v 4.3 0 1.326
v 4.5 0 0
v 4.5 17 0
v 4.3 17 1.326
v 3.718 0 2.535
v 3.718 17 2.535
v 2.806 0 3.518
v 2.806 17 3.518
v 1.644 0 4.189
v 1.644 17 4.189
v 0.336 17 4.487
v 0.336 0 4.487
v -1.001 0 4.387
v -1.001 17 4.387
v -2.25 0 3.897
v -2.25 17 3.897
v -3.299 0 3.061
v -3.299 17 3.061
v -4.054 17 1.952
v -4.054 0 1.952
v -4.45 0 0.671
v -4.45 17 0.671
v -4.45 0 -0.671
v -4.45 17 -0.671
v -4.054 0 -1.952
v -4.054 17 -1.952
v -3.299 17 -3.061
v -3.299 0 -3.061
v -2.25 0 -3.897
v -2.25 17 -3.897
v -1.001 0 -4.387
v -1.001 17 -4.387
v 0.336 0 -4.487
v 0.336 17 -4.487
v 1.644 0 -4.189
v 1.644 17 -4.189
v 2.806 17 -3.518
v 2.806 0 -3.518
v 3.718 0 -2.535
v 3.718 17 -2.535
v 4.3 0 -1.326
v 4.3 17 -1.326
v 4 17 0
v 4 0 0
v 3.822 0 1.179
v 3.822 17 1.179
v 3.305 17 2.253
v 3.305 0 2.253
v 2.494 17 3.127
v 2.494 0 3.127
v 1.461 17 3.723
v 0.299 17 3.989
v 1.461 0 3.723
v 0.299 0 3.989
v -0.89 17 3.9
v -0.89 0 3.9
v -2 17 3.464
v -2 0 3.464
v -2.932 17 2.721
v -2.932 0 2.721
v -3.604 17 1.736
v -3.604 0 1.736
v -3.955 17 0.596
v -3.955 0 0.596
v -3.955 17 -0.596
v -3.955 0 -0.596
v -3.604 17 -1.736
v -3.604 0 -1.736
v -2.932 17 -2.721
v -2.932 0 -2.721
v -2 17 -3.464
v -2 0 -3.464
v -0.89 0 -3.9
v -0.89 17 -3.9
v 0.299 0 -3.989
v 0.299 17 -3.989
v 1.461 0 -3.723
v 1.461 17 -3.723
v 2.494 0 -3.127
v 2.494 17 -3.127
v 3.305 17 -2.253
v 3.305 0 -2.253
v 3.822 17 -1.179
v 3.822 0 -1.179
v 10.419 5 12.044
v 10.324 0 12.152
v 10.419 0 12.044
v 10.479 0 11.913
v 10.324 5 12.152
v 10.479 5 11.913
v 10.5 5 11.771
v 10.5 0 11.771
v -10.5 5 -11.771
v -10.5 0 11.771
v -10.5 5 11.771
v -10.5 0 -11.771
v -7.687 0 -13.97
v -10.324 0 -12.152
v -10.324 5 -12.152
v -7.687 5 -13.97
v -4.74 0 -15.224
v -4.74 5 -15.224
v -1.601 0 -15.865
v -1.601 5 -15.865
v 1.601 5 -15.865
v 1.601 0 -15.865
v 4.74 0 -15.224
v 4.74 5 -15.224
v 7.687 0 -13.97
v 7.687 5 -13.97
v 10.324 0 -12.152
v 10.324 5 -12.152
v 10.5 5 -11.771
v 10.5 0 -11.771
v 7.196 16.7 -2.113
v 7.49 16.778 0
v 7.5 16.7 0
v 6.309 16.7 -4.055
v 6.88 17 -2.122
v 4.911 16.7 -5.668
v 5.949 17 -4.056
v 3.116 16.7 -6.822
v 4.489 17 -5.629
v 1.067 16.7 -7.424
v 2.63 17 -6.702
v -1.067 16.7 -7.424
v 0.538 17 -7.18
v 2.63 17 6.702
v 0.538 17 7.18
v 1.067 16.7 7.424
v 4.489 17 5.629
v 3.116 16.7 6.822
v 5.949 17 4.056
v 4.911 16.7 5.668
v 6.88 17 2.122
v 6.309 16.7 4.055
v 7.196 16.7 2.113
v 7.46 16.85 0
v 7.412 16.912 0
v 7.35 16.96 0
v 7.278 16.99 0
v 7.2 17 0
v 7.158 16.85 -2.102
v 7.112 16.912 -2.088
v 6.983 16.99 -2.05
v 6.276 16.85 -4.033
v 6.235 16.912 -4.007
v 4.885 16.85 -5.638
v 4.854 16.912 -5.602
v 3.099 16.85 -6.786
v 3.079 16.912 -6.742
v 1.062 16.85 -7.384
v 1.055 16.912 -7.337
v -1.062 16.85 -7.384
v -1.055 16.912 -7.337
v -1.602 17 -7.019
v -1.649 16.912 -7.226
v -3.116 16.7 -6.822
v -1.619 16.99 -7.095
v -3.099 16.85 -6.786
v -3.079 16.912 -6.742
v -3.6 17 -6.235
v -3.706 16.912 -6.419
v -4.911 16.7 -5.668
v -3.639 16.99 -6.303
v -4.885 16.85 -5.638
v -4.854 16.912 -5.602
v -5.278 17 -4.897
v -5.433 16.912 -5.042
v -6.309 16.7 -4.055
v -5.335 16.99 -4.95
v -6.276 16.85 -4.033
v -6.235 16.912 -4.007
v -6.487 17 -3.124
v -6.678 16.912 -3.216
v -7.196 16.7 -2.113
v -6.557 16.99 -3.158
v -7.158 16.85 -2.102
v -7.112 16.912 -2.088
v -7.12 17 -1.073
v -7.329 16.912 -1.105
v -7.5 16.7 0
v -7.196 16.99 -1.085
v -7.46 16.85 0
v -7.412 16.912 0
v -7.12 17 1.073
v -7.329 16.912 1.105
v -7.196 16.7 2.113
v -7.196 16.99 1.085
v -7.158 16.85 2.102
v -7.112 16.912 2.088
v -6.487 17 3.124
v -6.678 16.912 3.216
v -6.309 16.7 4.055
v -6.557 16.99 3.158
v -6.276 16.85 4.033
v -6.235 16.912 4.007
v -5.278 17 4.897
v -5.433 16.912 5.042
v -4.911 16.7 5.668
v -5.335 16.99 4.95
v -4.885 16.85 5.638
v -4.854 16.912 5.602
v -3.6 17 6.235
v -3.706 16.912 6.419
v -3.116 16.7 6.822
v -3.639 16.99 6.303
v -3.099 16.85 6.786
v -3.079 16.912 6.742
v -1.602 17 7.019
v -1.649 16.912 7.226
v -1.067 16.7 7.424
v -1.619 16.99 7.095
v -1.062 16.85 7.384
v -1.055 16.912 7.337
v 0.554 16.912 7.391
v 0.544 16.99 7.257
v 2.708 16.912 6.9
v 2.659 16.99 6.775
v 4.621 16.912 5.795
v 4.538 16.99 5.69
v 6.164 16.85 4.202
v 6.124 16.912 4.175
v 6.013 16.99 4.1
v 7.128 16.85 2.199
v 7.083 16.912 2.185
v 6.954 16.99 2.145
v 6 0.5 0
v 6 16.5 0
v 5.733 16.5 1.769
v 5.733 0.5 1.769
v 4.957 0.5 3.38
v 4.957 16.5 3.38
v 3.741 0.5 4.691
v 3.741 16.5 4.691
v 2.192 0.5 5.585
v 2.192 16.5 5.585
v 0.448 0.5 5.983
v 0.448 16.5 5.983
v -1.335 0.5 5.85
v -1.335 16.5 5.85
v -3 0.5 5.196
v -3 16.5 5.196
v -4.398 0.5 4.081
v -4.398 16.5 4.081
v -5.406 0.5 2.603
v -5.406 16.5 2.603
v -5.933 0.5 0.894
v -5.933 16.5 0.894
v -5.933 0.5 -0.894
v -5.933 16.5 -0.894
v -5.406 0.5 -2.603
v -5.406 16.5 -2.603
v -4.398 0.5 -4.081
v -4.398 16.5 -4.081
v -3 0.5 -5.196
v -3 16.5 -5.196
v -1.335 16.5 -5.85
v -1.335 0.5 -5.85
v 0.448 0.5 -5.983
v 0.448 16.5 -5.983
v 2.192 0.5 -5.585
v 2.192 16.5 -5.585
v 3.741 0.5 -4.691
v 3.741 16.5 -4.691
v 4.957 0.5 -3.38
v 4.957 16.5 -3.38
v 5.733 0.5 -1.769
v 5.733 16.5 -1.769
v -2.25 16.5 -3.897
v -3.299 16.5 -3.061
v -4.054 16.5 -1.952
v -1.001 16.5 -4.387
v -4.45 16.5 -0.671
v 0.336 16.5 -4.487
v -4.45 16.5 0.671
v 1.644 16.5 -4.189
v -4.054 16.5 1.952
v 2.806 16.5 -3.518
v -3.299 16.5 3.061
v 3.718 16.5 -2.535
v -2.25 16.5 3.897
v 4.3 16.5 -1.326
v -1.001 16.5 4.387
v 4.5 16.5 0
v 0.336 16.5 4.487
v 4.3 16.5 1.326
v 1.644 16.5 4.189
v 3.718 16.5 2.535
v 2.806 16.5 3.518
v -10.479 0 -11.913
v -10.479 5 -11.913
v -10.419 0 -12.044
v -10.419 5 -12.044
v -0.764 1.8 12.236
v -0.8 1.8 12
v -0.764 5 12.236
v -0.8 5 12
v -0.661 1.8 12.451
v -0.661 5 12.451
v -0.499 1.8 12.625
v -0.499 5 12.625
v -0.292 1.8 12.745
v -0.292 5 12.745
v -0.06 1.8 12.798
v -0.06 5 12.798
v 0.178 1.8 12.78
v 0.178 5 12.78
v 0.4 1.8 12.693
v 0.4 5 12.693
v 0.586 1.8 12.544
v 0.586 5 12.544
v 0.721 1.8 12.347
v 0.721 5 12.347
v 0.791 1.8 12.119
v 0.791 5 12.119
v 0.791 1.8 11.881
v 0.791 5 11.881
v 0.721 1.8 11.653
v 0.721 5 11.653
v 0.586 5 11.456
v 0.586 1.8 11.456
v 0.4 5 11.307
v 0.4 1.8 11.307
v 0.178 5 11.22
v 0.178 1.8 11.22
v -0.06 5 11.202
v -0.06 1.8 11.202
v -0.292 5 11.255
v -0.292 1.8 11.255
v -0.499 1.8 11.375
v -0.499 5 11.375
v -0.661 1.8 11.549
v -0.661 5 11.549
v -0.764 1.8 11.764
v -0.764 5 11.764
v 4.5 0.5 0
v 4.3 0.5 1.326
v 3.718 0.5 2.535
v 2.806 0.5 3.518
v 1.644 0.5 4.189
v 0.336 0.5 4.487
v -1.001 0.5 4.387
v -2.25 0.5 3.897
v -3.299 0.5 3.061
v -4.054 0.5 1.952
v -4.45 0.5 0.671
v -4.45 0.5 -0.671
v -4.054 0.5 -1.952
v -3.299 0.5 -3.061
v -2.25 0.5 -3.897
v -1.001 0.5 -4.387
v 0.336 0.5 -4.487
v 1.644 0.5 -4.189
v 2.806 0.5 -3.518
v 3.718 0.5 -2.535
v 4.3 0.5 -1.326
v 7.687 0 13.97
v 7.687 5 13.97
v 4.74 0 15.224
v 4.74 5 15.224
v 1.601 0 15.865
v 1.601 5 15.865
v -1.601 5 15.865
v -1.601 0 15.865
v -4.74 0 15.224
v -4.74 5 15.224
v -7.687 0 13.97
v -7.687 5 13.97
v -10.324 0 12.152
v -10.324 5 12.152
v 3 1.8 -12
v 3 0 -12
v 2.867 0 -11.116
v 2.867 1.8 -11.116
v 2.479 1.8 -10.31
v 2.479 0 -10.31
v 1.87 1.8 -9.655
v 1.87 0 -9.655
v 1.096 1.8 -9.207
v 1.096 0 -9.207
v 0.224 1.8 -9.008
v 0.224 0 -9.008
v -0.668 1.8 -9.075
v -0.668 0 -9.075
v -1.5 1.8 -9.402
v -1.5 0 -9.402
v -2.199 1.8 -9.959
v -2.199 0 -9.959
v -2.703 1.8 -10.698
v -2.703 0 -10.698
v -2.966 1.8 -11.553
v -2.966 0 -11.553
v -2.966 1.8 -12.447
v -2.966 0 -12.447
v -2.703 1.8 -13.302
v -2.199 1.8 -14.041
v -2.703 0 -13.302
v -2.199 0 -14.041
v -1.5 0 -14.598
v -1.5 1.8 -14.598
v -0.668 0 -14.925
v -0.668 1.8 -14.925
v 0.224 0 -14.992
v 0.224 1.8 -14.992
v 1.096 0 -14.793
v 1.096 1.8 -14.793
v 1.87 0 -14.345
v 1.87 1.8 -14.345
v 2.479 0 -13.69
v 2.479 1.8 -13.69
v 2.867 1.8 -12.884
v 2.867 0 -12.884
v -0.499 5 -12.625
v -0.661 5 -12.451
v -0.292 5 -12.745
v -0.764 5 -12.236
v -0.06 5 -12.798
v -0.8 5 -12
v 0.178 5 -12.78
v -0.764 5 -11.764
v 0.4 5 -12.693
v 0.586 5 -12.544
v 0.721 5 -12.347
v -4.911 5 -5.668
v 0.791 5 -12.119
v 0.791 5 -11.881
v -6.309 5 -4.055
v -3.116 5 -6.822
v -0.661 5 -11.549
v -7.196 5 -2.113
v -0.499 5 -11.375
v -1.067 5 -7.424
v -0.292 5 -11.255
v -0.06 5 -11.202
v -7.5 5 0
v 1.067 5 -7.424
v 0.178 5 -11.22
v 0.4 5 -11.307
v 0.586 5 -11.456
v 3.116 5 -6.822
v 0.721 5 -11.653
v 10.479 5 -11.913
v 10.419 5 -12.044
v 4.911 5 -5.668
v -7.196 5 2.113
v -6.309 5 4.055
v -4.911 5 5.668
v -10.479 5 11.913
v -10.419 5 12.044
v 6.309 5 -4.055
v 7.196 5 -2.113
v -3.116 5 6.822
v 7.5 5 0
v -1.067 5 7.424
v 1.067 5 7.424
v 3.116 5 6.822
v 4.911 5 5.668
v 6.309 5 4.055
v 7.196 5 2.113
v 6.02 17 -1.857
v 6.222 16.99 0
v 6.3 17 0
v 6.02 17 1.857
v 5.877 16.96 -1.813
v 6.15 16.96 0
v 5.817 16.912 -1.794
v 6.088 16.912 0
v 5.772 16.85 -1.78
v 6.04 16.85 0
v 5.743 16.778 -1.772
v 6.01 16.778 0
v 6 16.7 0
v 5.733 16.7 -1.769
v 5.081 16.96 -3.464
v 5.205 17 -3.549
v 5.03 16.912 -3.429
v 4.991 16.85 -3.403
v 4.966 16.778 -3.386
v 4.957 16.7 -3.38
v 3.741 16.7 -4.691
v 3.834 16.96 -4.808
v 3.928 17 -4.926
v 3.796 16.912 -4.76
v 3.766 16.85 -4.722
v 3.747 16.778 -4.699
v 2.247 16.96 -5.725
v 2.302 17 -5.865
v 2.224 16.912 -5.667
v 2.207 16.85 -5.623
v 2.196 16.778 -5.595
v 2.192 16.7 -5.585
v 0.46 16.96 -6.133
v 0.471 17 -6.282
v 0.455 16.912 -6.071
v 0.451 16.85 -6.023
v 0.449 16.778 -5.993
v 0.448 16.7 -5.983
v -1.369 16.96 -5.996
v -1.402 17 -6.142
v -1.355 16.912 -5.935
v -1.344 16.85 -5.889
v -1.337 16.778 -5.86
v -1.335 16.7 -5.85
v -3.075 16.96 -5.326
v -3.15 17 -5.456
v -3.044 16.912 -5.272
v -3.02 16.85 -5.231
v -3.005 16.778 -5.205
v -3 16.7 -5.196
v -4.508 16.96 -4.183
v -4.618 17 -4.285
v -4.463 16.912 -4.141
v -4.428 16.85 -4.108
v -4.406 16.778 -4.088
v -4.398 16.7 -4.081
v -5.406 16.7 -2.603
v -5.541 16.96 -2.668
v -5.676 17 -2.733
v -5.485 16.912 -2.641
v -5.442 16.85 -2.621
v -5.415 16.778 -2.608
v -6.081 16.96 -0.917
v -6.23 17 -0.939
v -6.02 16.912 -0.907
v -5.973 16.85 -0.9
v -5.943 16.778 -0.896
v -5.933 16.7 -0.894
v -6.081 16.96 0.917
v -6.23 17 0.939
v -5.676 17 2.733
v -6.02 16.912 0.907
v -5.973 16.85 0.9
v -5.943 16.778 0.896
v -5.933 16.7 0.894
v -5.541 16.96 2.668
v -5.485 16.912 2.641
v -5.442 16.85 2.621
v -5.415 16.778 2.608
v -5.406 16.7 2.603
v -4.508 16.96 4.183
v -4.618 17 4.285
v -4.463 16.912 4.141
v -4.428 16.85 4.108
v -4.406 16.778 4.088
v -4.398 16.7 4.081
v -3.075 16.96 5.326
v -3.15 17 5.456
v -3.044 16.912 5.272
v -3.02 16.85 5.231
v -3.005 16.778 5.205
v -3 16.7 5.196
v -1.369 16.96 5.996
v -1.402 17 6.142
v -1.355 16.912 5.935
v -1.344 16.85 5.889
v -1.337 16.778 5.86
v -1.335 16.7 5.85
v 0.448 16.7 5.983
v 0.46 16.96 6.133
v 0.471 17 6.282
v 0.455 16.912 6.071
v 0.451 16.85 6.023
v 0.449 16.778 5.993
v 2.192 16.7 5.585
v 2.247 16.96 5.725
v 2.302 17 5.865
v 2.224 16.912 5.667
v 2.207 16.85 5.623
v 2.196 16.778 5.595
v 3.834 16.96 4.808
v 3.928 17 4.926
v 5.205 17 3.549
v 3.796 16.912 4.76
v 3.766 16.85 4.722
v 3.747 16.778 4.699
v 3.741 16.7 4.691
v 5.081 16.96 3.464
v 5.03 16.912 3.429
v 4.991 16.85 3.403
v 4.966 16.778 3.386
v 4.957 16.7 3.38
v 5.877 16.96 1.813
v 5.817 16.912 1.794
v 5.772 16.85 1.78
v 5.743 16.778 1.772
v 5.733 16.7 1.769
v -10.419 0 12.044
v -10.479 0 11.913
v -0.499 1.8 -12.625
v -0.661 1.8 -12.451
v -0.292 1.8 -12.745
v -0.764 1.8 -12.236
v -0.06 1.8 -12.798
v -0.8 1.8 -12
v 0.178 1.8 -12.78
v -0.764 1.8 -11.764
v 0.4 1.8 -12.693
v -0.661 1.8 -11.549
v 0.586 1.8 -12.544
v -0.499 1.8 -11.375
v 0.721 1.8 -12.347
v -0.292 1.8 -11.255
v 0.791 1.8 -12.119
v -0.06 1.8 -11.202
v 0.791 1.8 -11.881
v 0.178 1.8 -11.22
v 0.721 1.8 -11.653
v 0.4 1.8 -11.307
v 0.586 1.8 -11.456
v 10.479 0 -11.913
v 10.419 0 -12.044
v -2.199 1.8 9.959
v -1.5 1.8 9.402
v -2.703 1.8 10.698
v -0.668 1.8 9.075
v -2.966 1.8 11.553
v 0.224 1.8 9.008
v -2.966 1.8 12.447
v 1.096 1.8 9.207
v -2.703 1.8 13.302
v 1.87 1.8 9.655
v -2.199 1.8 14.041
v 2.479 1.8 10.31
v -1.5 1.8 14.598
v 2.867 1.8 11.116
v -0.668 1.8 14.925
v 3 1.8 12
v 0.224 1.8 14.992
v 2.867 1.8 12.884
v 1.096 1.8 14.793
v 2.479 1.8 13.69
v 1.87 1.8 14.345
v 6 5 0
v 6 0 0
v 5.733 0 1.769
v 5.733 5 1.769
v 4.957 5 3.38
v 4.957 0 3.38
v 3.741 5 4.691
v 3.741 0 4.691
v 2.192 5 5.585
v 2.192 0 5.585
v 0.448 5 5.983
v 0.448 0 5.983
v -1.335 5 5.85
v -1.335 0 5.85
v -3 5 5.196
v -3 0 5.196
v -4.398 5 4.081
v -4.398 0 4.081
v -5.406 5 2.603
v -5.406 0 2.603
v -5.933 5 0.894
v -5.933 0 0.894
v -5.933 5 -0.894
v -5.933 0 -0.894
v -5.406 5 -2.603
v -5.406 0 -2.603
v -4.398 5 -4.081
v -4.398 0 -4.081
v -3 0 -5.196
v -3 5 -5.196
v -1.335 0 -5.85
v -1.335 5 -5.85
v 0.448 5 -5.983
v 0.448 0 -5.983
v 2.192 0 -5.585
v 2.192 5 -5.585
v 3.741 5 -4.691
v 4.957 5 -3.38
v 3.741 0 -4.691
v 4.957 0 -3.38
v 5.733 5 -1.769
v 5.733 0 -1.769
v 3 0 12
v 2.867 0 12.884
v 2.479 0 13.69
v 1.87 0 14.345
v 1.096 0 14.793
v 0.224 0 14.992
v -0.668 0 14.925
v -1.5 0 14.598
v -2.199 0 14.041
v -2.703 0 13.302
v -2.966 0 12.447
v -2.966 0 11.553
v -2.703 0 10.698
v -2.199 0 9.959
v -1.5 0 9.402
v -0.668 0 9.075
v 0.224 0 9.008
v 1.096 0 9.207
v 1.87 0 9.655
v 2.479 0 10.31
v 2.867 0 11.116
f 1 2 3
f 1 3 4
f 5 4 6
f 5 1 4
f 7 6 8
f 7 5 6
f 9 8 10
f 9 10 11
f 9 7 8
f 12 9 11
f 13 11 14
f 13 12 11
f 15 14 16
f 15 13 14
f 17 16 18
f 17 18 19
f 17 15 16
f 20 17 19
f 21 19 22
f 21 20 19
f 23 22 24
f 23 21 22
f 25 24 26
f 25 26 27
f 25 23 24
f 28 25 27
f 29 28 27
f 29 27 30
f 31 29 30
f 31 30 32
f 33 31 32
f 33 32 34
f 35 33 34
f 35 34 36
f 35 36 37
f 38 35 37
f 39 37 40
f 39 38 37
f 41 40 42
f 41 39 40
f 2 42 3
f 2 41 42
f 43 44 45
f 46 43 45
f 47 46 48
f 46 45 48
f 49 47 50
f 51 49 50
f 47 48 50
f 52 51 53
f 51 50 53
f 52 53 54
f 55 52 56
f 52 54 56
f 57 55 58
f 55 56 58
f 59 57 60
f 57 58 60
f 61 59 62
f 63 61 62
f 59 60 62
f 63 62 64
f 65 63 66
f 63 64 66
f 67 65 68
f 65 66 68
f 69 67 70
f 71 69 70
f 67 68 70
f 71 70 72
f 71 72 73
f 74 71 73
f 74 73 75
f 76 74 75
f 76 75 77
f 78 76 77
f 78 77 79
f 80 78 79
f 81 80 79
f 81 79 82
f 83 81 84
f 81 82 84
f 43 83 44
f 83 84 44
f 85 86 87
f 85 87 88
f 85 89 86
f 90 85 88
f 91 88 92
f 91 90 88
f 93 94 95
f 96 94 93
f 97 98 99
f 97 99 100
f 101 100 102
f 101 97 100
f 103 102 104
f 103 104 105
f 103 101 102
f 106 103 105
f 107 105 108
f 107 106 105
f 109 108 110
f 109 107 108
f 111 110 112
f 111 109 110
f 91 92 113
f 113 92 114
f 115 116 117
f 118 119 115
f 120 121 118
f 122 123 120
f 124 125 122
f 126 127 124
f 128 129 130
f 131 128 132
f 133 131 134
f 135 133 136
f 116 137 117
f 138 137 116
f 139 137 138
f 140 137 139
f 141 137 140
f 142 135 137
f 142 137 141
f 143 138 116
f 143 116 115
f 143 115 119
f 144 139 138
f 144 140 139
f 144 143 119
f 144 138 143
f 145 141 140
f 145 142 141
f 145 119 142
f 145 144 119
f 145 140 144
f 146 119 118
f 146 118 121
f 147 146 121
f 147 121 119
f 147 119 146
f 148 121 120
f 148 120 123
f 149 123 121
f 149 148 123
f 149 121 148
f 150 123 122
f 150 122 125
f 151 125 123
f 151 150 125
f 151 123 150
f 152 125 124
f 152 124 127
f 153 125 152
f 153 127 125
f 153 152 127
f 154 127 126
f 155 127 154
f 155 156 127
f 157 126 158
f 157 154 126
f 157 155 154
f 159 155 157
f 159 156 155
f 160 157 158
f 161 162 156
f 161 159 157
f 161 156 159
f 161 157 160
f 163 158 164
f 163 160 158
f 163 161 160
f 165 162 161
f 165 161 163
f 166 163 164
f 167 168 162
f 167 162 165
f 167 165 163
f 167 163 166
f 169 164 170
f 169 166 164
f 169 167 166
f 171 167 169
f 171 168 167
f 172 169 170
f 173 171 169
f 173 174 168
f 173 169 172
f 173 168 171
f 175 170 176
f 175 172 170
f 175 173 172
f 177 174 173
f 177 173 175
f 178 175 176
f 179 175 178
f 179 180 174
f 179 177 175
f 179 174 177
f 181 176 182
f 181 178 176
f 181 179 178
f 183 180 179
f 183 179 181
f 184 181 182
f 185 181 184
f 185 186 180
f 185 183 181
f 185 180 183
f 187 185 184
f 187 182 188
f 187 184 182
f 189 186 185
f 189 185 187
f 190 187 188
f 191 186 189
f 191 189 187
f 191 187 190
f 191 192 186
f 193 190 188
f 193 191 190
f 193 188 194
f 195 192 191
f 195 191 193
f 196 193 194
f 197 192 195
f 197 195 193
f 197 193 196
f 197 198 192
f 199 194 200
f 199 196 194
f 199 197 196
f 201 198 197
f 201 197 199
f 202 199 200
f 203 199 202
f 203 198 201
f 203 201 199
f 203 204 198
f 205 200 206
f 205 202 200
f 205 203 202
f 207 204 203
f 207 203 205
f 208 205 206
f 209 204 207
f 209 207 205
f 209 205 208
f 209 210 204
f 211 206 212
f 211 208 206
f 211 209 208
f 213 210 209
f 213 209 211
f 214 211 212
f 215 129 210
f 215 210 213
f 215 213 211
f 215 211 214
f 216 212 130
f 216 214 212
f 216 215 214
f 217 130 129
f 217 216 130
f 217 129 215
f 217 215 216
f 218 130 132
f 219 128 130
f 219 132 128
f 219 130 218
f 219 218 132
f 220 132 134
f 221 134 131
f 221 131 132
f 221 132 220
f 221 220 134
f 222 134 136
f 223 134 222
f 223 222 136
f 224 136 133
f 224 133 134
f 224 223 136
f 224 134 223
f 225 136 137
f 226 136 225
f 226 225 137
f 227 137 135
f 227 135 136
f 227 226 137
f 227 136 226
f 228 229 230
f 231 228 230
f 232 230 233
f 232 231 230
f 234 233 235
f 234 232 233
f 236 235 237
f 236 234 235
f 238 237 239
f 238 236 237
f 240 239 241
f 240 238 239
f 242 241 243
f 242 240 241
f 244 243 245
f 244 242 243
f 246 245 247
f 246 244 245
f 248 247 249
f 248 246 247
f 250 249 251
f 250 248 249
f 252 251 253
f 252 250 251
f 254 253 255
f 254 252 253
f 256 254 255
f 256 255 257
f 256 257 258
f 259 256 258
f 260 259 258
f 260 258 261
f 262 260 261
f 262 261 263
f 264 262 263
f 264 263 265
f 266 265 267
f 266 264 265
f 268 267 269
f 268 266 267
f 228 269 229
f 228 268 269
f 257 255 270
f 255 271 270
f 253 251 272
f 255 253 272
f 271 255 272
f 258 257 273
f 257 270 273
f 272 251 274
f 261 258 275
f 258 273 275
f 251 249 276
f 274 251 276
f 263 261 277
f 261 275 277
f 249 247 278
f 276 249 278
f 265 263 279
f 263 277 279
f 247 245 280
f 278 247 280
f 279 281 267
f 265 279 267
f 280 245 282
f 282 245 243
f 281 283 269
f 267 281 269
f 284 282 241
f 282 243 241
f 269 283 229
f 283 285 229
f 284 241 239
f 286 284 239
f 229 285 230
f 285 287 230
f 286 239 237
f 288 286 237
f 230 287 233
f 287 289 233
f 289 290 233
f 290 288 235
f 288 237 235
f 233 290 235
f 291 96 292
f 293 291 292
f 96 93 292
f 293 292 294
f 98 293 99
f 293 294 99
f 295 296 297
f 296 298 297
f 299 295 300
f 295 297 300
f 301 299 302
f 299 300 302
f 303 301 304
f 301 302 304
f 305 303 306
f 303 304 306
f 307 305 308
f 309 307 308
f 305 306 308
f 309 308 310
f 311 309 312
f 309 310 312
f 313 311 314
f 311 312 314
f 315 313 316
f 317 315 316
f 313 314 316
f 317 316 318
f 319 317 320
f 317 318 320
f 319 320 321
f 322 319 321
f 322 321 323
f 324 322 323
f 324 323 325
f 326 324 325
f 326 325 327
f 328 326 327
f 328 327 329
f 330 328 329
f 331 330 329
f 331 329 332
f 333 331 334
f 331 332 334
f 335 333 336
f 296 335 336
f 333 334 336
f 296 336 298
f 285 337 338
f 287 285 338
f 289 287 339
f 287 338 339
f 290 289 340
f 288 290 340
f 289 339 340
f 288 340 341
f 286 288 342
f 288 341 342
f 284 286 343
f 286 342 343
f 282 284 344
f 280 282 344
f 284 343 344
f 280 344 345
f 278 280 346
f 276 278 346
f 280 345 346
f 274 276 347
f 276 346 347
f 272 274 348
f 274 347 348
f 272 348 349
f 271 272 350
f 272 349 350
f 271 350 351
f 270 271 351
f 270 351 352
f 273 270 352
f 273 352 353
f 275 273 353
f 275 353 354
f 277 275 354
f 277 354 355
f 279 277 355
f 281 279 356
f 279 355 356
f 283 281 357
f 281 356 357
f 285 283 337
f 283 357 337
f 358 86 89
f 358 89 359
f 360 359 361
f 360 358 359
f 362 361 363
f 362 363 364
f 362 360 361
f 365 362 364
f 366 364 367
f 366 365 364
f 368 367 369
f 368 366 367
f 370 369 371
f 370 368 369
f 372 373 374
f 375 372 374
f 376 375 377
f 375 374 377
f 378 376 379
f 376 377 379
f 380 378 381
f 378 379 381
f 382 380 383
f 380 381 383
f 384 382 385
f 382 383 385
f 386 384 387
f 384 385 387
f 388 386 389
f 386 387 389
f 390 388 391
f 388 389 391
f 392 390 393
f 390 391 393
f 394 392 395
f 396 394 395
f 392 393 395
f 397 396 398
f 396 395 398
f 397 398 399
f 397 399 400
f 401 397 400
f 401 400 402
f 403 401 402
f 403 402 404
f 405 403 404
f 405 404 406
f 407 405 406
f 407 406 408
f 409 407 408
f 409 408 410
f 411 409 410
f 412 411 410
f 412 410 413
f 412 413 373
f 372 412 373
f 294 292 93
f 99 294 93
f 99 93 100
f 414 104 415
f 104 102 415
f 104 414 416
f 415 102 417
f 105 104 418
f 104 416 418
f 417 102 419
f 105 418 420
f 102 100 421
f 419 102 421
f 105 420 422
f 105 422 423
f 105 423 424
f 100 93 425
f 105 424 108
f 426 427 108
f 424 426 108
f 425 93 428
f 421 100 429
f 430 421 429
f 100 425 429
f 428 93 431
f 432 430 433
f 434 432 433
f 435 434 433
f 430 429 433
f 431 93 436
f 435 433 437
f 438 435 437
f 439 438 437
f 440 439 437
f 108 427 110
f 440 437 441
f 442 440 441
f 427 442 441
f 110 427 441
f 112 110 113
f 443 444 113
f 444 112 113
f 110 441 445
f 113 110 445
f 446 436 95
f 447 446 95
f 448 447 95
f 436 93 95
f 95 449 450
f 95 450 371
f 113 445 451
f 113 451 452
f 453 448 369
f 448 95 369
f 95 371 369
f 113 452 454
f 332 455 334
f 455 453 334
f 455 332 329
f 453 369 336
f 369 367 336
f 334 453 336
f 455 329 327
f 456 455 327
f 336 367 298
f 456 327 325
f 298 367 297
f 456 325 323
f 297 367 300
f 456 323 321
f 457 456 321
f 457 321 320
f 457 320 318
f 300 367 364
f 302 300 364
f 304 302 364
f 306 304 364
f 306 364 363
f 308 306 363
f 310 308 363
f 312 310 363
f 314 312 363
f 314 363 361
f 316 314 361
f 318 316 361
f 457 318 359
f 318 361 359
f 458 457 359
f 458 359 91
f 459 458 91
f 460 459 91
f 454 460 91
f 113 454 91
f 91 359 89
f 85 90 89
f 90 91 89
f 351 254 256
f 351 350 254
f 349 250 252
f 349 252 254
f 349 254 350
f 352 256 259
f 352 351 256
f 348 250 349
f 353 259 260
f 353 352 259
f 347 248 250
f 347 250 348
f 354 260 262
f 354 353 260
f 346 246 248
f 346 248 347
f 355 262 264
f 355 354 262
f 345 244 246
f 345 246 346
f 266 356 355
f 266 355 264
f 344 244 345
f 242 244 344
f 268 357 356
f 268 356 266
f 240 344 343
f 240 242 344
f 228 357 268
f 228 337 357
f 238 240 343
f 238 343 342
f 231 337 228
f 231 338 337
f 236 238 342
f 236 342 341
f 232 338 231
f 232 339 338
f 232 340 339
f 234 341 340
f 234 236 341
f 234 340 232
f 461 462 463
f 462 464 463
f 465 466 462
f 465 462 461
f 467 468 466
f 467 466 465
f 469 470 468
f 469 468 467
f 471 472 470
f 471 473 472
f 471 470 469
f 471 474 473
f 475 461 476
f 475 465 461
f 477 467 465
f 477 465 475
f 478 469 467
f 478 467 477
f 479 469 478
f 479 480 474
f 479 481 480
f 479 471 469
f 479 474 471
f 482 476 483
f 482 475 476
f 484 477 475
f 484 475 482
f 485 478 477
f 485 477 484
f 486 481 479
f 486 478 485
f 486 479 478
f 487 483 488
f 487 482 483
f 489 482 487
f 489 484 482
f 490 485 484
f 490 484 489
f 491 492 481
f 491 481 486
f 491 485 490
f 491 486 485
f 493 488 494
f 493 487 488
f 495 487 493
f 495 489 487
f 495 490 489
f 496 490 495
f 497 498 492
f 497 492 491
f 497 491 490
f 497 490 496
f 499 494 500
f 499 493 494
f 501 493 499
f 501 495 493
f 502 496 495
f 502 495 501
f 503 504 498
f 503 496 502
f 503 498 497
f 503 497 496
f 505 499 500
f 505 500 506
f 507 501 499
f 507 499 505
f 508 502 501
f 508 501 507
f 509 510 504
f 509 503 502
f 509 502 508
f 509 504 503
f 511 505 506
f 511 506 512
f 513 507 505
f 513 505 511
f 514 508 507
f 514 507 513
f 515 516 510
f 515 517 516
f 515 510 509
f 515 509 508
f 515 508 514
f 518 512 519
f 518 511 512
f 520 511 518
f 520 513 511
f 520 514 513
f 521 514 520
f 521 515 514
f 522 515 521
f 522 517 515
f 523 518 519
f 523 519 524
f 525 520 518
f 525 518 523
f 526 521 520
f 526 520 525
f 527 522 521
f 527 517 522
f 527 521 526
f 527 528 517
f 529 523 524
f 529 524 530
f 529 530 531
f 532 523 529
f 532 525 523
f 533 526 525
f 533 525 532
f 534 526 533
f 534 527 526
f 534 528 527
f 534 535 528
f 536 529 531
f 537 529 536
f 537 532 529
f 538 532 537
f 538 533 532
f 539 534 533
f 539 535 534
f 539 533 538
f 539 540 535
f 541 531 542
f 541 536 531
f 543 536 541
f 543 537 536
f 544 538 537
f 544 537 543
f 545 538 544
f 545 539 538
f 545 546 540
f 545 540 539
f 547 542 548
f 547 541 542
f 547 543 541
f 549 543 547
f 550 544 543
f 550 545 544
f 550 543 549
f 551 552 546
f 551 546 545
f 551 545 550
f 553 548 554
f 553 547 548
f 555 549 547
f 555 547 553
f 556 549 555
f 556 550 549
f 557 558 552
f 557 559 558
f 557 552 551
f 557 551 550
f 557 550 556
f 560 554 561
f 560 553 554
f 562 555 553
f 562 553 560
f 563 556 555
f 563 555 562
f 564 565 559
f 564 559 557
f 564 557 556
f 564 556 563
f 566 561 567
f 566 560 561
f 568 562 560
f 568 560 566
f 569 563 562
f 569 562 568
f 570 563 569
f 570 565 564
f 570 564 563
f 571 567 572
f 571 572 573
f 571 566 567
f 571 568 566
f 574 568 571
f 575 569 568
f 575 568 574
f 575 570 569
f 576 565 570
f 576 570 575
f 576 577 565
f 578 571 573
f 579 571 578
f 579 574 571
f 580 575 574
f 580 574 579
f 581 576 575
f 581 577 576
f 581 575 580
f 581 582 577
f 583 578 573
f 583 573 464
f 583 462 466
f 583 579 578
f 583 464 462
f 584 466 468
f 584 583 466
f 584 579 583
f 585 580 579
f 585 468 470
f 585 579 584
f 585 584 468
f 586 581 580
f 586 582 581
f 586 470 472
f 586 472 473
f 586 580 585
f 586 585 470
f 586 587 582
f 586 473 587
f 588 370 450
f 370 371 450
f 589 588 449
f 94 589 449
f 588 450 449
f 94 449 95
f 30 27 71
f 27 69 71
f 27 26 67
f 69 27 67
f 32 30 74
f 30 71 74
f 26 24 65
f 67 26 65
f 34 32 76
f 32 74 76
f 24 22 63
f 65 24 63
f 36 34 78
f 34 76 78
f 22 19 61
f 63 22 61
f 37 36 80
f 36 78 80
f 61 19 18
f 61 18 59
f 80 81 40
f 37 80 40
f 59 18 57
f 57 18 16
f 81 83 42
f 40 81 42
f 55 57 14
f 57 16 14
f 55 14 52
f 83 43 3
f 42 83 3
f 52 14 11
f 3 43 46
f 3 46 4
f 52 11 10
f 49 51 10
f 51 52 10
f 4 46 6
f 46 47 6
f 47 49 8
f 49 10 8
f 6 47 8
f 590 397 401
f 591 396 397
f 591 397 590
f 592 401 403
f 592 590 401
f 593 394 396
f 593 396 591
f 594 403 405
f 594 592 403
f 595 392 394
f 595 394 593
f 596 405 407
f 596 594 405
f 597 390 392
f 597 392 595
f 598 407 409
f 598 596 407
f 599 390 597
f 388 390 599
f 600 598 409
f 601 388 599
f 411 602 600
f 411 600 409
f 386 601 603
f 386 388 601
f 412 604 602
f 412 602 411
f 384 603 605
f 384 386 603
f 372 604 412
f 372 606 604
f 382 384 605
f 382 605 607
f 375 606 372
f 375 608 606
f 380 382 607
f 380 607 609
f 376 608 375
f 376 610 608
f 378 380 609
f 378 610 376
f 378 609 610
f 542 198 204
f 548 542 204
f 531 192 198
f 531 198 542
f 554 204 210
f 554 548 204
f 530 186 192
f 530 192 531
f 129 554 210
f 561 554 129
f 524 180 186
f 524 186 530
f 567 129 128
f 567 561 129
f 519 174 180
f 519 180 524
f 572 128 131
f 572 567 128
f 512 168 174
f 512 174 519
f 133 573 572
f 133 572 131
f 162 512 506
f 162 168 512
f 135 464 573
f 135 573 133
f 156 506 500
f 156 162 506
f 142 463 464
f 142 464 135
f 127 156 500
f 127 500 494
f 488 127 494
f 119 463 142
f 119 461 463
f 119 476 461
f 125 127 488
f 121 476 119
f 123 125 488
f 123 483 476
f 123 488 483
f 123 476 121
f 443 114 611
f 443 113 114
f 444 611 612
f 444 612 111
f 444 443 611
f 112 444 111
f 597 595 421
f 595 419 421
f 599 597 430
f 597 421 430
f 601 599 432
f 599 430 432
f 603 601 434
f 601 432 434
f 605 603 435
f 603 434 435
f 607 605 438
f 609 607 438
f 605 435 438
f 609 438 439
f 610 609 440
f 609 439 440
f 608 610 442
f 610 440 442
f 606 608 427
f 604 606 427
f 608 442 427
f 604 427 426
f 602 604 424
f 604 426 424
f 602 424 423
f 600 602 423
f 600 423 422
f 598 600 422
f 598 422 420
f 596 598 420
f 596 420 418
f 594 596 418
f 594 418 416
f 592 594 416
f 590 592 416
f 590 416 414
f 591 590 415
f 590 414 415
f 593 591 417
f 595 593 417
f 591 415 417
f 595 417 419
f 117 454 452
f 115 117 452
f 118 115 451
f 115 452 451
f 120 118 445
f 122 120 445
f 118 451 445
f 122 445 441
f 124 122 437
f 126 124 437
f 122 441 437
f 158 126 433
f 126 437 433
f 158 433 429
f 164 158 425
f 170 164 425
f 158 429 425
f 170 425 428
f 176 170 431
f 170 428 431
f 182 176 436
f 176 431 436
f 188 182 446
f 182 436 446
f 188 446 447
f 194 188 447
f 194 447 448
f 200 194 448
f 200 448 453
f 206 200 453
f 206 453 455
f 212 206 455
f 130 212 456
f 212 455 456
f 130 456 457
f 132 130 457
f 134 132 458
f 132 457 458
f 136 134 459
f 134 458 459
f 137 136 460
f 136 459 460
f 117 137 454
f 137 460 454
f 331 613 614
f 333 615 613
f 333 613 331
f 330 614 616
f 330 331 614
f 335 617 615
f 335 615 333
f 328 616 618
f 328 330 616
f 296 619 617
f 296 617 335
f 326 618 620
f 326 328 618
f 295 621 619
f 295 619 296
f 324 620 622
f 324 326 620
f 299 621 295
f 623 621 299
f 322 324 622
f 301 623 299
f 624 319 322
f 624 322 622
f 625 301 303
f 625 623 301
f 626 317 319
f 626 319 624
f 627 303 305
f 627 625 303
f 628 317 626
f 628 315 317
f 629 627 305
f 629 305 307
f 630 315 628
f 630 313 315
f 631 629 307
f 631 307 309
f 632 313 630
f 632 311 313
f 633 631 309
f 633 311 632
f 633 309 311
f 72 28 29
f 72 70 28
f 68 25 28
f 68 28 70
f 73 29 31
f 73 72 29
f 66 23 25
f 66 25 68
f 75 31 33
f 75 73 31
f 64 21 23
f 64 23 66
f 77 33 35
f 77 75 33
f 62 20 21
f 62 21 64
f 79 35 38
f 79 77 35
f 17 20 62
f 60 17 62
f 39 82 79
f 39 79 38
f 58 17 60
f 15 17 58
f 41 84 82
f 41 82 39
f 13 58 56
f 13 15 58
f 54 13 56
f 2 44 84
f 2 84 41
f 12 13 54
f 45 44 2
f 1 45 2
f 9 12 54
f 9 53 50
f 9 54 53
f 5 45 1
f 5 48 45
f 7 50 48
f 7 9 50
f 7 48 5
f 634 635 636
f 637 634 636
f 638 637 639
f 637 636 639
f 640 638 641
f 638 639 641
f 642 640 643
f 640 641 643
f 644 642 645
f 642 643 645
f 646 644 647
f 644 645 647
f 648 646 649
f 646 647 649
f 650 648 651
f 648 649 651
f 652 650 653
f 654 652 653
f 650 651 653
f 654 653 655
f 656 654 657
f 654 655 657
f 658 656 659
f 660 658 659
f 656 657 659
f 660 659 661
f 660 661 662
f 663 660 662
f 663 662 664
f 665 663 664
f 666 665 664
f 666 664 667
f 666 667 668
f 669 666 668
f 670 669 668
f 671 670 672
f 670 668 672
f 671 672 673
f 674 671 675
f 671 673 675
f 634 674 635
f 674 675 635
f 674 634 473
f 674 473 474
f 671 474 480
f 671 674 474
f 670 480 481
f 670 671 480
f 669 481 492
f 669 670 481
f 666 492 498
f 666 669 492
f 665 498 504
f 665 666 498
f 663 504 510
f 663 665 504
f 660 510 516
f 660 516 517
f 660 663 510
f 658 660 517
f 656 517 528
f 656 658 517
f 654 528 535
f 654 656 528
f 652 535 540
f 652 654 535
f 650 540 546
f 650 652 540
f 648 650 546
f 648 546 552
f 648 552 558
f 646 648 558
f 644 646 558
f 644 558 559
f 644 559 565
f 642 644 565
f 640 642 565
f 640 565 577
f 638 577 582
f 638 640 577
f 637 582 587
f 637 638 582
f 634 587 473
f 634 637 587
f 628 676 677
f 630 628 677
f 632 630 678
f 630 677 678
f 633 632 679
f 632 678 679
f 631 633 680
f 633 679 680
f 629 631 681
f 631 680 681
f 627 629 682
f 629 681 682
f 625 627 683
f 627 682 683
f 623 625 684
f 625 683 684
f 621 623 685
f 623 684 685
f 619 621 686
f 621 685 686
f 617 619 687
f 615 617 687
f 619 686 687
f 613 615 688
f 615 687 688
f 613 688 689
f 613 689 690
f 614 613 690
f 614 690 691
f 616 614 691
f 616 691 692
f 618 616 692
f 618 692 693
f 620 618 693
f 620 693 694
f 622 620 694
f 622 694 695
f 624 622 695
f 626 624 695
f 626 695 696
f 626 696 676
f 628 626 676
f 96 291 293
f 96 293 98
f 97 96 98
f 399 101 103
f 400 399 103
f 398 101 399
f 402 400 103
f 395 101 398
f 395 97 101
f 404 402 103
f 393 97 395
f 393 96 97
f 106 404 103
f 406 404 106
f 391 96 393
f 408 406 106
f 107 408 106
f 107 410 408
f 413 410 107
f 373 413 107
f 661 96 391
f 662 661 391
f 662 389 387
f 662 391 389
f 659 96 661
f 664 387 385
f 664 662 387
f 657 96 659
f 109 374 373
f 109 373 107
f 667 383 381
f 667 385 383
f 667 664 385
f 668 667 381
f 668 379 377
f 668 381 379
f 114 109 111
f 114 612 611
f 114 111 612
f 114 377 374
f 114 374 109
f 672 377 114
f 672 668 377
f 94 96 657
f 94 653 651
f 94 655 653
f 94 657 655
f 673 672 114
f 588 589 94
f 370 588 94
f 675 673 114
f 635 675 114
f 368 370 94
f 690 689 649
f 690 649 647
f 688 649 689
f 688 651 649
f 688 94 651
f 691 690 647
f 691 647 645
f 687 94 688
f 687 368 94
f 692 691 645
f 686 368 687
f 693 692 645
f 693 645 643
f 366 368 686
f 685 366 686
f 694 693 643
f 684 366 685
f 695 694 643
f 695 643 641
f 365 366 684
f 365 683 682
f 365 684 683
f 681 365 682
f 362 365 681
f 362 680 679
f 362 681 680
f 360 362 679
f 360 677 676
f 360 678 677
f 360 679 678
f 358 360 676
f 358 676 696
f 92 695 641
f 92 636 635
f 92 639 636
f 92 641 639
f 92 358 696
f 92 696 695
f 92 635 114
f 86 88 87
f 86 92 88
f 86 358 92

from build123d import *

# Parameters (mm, degrees)
SKETCH_R         = 6
PAD_DEPTH        = 5
HOLE_D           = 1.6
HOLE_CBORE_D     = 6
HOLE_CBORE_DEPTH = 1.8
SKETCH002_R      = 7.5
SKETCH002_R_2    = 6
PAD001_DEPTH     = 12
FILLET_R         = 0.5
FILLET001_R      = 0.3
SKETCH003_R      = 6
SKETCH003_R_2    = 4.5
PAD002_DEPTH     = 16
SKETCH004_R      = 4.5
SKETCH004_R_2    = 4
PAD003_DEPTH     = 17


with BuildPart() as body:
    # Sketch → Pad (new body)
    with BuildSketch(Plane.XZ):
        with BuildLine():
            ThreePointArc((10.5, 12), (0, 15.945219), (-10.5, 12))
            Line((-10.5, 12), (-10.5, -12))
            ThreePointArc((-10.5, -12), (0, -15.945219), (10.5, -12))
            Line((10.5, 12), (10.5, -12))
        make_face()
        Circle(SKETCH_R, mode=Mode.SUBTRACT)
    extrude(amount=-PAD_DEPTH)

    # Hole (through all)
    with Locations(Plane.XZ):
        with Locations((0, 12), (0, -12)):
            CounterBoreHole(HOLE_D / 2, HOLE_CBORE_D / 2, HOLE_CBORE_DEPTH)

    # Sketch002 (on Face5 of Hole) → Pad001 (join)
    with BuildSketch(Plane(origin=(0, 5, 0), x_dir=(1, 0, 0), z_dir=(0, 1, 0))):
        Circle(SKETCH002_R)
        Circle(SKETCH002_R_2, mode=Mode.SUBTRACT)
    extrude(amount=PAD001_DEPTH)

    # Fillet
    fillet_edges = [body.edges().sort_by_distance(p)[0] for p in [
        (10.5, 2.5, -12),
        (10.5, 2.5, 12),
        (-10.5, 2.5, 12),
        (-10.5, 2.5, -12),
    ]]
    fillet(fillet_edges, radius=FILLET_R)

    # Fillet001
    fillet001_edges = [body.edges().sort_by_distance(p)[0] for p in [
        (-7.5, 17, 0),
        (-6, 17, 0),
    ]]
    fillet(fillet001_edges, radius=FILLET001_R)


with BuildPart() as body001:
    # Sketch003 → Pad002 (new body)
    with BuildSketch(Plane.XZ):
        Circle(SKETCH003_R)
        Circle(SKETCH003_R_2, mode=Mode.SUBTRACT)
    extrude(amount=-PAD002_DEPTH)


with BuildPart() as body001_1:
    # Body001 placement: moved
    add(body001.part.moved(Location((0, 0.5, 0))))


with BuildPart() as body002:
    # Sketch004 → Pad003 (new body)
    with BuildSketch(Plane.XZ):
        Circle(SKETCH004_R)
        Circle(SKETCH004_R_2, mode=Mode.SUBTRACT)
    extrude(amount=-PAD003_DEPTH)


solid = Compound([body.part, body001_1.part, body002.part])
